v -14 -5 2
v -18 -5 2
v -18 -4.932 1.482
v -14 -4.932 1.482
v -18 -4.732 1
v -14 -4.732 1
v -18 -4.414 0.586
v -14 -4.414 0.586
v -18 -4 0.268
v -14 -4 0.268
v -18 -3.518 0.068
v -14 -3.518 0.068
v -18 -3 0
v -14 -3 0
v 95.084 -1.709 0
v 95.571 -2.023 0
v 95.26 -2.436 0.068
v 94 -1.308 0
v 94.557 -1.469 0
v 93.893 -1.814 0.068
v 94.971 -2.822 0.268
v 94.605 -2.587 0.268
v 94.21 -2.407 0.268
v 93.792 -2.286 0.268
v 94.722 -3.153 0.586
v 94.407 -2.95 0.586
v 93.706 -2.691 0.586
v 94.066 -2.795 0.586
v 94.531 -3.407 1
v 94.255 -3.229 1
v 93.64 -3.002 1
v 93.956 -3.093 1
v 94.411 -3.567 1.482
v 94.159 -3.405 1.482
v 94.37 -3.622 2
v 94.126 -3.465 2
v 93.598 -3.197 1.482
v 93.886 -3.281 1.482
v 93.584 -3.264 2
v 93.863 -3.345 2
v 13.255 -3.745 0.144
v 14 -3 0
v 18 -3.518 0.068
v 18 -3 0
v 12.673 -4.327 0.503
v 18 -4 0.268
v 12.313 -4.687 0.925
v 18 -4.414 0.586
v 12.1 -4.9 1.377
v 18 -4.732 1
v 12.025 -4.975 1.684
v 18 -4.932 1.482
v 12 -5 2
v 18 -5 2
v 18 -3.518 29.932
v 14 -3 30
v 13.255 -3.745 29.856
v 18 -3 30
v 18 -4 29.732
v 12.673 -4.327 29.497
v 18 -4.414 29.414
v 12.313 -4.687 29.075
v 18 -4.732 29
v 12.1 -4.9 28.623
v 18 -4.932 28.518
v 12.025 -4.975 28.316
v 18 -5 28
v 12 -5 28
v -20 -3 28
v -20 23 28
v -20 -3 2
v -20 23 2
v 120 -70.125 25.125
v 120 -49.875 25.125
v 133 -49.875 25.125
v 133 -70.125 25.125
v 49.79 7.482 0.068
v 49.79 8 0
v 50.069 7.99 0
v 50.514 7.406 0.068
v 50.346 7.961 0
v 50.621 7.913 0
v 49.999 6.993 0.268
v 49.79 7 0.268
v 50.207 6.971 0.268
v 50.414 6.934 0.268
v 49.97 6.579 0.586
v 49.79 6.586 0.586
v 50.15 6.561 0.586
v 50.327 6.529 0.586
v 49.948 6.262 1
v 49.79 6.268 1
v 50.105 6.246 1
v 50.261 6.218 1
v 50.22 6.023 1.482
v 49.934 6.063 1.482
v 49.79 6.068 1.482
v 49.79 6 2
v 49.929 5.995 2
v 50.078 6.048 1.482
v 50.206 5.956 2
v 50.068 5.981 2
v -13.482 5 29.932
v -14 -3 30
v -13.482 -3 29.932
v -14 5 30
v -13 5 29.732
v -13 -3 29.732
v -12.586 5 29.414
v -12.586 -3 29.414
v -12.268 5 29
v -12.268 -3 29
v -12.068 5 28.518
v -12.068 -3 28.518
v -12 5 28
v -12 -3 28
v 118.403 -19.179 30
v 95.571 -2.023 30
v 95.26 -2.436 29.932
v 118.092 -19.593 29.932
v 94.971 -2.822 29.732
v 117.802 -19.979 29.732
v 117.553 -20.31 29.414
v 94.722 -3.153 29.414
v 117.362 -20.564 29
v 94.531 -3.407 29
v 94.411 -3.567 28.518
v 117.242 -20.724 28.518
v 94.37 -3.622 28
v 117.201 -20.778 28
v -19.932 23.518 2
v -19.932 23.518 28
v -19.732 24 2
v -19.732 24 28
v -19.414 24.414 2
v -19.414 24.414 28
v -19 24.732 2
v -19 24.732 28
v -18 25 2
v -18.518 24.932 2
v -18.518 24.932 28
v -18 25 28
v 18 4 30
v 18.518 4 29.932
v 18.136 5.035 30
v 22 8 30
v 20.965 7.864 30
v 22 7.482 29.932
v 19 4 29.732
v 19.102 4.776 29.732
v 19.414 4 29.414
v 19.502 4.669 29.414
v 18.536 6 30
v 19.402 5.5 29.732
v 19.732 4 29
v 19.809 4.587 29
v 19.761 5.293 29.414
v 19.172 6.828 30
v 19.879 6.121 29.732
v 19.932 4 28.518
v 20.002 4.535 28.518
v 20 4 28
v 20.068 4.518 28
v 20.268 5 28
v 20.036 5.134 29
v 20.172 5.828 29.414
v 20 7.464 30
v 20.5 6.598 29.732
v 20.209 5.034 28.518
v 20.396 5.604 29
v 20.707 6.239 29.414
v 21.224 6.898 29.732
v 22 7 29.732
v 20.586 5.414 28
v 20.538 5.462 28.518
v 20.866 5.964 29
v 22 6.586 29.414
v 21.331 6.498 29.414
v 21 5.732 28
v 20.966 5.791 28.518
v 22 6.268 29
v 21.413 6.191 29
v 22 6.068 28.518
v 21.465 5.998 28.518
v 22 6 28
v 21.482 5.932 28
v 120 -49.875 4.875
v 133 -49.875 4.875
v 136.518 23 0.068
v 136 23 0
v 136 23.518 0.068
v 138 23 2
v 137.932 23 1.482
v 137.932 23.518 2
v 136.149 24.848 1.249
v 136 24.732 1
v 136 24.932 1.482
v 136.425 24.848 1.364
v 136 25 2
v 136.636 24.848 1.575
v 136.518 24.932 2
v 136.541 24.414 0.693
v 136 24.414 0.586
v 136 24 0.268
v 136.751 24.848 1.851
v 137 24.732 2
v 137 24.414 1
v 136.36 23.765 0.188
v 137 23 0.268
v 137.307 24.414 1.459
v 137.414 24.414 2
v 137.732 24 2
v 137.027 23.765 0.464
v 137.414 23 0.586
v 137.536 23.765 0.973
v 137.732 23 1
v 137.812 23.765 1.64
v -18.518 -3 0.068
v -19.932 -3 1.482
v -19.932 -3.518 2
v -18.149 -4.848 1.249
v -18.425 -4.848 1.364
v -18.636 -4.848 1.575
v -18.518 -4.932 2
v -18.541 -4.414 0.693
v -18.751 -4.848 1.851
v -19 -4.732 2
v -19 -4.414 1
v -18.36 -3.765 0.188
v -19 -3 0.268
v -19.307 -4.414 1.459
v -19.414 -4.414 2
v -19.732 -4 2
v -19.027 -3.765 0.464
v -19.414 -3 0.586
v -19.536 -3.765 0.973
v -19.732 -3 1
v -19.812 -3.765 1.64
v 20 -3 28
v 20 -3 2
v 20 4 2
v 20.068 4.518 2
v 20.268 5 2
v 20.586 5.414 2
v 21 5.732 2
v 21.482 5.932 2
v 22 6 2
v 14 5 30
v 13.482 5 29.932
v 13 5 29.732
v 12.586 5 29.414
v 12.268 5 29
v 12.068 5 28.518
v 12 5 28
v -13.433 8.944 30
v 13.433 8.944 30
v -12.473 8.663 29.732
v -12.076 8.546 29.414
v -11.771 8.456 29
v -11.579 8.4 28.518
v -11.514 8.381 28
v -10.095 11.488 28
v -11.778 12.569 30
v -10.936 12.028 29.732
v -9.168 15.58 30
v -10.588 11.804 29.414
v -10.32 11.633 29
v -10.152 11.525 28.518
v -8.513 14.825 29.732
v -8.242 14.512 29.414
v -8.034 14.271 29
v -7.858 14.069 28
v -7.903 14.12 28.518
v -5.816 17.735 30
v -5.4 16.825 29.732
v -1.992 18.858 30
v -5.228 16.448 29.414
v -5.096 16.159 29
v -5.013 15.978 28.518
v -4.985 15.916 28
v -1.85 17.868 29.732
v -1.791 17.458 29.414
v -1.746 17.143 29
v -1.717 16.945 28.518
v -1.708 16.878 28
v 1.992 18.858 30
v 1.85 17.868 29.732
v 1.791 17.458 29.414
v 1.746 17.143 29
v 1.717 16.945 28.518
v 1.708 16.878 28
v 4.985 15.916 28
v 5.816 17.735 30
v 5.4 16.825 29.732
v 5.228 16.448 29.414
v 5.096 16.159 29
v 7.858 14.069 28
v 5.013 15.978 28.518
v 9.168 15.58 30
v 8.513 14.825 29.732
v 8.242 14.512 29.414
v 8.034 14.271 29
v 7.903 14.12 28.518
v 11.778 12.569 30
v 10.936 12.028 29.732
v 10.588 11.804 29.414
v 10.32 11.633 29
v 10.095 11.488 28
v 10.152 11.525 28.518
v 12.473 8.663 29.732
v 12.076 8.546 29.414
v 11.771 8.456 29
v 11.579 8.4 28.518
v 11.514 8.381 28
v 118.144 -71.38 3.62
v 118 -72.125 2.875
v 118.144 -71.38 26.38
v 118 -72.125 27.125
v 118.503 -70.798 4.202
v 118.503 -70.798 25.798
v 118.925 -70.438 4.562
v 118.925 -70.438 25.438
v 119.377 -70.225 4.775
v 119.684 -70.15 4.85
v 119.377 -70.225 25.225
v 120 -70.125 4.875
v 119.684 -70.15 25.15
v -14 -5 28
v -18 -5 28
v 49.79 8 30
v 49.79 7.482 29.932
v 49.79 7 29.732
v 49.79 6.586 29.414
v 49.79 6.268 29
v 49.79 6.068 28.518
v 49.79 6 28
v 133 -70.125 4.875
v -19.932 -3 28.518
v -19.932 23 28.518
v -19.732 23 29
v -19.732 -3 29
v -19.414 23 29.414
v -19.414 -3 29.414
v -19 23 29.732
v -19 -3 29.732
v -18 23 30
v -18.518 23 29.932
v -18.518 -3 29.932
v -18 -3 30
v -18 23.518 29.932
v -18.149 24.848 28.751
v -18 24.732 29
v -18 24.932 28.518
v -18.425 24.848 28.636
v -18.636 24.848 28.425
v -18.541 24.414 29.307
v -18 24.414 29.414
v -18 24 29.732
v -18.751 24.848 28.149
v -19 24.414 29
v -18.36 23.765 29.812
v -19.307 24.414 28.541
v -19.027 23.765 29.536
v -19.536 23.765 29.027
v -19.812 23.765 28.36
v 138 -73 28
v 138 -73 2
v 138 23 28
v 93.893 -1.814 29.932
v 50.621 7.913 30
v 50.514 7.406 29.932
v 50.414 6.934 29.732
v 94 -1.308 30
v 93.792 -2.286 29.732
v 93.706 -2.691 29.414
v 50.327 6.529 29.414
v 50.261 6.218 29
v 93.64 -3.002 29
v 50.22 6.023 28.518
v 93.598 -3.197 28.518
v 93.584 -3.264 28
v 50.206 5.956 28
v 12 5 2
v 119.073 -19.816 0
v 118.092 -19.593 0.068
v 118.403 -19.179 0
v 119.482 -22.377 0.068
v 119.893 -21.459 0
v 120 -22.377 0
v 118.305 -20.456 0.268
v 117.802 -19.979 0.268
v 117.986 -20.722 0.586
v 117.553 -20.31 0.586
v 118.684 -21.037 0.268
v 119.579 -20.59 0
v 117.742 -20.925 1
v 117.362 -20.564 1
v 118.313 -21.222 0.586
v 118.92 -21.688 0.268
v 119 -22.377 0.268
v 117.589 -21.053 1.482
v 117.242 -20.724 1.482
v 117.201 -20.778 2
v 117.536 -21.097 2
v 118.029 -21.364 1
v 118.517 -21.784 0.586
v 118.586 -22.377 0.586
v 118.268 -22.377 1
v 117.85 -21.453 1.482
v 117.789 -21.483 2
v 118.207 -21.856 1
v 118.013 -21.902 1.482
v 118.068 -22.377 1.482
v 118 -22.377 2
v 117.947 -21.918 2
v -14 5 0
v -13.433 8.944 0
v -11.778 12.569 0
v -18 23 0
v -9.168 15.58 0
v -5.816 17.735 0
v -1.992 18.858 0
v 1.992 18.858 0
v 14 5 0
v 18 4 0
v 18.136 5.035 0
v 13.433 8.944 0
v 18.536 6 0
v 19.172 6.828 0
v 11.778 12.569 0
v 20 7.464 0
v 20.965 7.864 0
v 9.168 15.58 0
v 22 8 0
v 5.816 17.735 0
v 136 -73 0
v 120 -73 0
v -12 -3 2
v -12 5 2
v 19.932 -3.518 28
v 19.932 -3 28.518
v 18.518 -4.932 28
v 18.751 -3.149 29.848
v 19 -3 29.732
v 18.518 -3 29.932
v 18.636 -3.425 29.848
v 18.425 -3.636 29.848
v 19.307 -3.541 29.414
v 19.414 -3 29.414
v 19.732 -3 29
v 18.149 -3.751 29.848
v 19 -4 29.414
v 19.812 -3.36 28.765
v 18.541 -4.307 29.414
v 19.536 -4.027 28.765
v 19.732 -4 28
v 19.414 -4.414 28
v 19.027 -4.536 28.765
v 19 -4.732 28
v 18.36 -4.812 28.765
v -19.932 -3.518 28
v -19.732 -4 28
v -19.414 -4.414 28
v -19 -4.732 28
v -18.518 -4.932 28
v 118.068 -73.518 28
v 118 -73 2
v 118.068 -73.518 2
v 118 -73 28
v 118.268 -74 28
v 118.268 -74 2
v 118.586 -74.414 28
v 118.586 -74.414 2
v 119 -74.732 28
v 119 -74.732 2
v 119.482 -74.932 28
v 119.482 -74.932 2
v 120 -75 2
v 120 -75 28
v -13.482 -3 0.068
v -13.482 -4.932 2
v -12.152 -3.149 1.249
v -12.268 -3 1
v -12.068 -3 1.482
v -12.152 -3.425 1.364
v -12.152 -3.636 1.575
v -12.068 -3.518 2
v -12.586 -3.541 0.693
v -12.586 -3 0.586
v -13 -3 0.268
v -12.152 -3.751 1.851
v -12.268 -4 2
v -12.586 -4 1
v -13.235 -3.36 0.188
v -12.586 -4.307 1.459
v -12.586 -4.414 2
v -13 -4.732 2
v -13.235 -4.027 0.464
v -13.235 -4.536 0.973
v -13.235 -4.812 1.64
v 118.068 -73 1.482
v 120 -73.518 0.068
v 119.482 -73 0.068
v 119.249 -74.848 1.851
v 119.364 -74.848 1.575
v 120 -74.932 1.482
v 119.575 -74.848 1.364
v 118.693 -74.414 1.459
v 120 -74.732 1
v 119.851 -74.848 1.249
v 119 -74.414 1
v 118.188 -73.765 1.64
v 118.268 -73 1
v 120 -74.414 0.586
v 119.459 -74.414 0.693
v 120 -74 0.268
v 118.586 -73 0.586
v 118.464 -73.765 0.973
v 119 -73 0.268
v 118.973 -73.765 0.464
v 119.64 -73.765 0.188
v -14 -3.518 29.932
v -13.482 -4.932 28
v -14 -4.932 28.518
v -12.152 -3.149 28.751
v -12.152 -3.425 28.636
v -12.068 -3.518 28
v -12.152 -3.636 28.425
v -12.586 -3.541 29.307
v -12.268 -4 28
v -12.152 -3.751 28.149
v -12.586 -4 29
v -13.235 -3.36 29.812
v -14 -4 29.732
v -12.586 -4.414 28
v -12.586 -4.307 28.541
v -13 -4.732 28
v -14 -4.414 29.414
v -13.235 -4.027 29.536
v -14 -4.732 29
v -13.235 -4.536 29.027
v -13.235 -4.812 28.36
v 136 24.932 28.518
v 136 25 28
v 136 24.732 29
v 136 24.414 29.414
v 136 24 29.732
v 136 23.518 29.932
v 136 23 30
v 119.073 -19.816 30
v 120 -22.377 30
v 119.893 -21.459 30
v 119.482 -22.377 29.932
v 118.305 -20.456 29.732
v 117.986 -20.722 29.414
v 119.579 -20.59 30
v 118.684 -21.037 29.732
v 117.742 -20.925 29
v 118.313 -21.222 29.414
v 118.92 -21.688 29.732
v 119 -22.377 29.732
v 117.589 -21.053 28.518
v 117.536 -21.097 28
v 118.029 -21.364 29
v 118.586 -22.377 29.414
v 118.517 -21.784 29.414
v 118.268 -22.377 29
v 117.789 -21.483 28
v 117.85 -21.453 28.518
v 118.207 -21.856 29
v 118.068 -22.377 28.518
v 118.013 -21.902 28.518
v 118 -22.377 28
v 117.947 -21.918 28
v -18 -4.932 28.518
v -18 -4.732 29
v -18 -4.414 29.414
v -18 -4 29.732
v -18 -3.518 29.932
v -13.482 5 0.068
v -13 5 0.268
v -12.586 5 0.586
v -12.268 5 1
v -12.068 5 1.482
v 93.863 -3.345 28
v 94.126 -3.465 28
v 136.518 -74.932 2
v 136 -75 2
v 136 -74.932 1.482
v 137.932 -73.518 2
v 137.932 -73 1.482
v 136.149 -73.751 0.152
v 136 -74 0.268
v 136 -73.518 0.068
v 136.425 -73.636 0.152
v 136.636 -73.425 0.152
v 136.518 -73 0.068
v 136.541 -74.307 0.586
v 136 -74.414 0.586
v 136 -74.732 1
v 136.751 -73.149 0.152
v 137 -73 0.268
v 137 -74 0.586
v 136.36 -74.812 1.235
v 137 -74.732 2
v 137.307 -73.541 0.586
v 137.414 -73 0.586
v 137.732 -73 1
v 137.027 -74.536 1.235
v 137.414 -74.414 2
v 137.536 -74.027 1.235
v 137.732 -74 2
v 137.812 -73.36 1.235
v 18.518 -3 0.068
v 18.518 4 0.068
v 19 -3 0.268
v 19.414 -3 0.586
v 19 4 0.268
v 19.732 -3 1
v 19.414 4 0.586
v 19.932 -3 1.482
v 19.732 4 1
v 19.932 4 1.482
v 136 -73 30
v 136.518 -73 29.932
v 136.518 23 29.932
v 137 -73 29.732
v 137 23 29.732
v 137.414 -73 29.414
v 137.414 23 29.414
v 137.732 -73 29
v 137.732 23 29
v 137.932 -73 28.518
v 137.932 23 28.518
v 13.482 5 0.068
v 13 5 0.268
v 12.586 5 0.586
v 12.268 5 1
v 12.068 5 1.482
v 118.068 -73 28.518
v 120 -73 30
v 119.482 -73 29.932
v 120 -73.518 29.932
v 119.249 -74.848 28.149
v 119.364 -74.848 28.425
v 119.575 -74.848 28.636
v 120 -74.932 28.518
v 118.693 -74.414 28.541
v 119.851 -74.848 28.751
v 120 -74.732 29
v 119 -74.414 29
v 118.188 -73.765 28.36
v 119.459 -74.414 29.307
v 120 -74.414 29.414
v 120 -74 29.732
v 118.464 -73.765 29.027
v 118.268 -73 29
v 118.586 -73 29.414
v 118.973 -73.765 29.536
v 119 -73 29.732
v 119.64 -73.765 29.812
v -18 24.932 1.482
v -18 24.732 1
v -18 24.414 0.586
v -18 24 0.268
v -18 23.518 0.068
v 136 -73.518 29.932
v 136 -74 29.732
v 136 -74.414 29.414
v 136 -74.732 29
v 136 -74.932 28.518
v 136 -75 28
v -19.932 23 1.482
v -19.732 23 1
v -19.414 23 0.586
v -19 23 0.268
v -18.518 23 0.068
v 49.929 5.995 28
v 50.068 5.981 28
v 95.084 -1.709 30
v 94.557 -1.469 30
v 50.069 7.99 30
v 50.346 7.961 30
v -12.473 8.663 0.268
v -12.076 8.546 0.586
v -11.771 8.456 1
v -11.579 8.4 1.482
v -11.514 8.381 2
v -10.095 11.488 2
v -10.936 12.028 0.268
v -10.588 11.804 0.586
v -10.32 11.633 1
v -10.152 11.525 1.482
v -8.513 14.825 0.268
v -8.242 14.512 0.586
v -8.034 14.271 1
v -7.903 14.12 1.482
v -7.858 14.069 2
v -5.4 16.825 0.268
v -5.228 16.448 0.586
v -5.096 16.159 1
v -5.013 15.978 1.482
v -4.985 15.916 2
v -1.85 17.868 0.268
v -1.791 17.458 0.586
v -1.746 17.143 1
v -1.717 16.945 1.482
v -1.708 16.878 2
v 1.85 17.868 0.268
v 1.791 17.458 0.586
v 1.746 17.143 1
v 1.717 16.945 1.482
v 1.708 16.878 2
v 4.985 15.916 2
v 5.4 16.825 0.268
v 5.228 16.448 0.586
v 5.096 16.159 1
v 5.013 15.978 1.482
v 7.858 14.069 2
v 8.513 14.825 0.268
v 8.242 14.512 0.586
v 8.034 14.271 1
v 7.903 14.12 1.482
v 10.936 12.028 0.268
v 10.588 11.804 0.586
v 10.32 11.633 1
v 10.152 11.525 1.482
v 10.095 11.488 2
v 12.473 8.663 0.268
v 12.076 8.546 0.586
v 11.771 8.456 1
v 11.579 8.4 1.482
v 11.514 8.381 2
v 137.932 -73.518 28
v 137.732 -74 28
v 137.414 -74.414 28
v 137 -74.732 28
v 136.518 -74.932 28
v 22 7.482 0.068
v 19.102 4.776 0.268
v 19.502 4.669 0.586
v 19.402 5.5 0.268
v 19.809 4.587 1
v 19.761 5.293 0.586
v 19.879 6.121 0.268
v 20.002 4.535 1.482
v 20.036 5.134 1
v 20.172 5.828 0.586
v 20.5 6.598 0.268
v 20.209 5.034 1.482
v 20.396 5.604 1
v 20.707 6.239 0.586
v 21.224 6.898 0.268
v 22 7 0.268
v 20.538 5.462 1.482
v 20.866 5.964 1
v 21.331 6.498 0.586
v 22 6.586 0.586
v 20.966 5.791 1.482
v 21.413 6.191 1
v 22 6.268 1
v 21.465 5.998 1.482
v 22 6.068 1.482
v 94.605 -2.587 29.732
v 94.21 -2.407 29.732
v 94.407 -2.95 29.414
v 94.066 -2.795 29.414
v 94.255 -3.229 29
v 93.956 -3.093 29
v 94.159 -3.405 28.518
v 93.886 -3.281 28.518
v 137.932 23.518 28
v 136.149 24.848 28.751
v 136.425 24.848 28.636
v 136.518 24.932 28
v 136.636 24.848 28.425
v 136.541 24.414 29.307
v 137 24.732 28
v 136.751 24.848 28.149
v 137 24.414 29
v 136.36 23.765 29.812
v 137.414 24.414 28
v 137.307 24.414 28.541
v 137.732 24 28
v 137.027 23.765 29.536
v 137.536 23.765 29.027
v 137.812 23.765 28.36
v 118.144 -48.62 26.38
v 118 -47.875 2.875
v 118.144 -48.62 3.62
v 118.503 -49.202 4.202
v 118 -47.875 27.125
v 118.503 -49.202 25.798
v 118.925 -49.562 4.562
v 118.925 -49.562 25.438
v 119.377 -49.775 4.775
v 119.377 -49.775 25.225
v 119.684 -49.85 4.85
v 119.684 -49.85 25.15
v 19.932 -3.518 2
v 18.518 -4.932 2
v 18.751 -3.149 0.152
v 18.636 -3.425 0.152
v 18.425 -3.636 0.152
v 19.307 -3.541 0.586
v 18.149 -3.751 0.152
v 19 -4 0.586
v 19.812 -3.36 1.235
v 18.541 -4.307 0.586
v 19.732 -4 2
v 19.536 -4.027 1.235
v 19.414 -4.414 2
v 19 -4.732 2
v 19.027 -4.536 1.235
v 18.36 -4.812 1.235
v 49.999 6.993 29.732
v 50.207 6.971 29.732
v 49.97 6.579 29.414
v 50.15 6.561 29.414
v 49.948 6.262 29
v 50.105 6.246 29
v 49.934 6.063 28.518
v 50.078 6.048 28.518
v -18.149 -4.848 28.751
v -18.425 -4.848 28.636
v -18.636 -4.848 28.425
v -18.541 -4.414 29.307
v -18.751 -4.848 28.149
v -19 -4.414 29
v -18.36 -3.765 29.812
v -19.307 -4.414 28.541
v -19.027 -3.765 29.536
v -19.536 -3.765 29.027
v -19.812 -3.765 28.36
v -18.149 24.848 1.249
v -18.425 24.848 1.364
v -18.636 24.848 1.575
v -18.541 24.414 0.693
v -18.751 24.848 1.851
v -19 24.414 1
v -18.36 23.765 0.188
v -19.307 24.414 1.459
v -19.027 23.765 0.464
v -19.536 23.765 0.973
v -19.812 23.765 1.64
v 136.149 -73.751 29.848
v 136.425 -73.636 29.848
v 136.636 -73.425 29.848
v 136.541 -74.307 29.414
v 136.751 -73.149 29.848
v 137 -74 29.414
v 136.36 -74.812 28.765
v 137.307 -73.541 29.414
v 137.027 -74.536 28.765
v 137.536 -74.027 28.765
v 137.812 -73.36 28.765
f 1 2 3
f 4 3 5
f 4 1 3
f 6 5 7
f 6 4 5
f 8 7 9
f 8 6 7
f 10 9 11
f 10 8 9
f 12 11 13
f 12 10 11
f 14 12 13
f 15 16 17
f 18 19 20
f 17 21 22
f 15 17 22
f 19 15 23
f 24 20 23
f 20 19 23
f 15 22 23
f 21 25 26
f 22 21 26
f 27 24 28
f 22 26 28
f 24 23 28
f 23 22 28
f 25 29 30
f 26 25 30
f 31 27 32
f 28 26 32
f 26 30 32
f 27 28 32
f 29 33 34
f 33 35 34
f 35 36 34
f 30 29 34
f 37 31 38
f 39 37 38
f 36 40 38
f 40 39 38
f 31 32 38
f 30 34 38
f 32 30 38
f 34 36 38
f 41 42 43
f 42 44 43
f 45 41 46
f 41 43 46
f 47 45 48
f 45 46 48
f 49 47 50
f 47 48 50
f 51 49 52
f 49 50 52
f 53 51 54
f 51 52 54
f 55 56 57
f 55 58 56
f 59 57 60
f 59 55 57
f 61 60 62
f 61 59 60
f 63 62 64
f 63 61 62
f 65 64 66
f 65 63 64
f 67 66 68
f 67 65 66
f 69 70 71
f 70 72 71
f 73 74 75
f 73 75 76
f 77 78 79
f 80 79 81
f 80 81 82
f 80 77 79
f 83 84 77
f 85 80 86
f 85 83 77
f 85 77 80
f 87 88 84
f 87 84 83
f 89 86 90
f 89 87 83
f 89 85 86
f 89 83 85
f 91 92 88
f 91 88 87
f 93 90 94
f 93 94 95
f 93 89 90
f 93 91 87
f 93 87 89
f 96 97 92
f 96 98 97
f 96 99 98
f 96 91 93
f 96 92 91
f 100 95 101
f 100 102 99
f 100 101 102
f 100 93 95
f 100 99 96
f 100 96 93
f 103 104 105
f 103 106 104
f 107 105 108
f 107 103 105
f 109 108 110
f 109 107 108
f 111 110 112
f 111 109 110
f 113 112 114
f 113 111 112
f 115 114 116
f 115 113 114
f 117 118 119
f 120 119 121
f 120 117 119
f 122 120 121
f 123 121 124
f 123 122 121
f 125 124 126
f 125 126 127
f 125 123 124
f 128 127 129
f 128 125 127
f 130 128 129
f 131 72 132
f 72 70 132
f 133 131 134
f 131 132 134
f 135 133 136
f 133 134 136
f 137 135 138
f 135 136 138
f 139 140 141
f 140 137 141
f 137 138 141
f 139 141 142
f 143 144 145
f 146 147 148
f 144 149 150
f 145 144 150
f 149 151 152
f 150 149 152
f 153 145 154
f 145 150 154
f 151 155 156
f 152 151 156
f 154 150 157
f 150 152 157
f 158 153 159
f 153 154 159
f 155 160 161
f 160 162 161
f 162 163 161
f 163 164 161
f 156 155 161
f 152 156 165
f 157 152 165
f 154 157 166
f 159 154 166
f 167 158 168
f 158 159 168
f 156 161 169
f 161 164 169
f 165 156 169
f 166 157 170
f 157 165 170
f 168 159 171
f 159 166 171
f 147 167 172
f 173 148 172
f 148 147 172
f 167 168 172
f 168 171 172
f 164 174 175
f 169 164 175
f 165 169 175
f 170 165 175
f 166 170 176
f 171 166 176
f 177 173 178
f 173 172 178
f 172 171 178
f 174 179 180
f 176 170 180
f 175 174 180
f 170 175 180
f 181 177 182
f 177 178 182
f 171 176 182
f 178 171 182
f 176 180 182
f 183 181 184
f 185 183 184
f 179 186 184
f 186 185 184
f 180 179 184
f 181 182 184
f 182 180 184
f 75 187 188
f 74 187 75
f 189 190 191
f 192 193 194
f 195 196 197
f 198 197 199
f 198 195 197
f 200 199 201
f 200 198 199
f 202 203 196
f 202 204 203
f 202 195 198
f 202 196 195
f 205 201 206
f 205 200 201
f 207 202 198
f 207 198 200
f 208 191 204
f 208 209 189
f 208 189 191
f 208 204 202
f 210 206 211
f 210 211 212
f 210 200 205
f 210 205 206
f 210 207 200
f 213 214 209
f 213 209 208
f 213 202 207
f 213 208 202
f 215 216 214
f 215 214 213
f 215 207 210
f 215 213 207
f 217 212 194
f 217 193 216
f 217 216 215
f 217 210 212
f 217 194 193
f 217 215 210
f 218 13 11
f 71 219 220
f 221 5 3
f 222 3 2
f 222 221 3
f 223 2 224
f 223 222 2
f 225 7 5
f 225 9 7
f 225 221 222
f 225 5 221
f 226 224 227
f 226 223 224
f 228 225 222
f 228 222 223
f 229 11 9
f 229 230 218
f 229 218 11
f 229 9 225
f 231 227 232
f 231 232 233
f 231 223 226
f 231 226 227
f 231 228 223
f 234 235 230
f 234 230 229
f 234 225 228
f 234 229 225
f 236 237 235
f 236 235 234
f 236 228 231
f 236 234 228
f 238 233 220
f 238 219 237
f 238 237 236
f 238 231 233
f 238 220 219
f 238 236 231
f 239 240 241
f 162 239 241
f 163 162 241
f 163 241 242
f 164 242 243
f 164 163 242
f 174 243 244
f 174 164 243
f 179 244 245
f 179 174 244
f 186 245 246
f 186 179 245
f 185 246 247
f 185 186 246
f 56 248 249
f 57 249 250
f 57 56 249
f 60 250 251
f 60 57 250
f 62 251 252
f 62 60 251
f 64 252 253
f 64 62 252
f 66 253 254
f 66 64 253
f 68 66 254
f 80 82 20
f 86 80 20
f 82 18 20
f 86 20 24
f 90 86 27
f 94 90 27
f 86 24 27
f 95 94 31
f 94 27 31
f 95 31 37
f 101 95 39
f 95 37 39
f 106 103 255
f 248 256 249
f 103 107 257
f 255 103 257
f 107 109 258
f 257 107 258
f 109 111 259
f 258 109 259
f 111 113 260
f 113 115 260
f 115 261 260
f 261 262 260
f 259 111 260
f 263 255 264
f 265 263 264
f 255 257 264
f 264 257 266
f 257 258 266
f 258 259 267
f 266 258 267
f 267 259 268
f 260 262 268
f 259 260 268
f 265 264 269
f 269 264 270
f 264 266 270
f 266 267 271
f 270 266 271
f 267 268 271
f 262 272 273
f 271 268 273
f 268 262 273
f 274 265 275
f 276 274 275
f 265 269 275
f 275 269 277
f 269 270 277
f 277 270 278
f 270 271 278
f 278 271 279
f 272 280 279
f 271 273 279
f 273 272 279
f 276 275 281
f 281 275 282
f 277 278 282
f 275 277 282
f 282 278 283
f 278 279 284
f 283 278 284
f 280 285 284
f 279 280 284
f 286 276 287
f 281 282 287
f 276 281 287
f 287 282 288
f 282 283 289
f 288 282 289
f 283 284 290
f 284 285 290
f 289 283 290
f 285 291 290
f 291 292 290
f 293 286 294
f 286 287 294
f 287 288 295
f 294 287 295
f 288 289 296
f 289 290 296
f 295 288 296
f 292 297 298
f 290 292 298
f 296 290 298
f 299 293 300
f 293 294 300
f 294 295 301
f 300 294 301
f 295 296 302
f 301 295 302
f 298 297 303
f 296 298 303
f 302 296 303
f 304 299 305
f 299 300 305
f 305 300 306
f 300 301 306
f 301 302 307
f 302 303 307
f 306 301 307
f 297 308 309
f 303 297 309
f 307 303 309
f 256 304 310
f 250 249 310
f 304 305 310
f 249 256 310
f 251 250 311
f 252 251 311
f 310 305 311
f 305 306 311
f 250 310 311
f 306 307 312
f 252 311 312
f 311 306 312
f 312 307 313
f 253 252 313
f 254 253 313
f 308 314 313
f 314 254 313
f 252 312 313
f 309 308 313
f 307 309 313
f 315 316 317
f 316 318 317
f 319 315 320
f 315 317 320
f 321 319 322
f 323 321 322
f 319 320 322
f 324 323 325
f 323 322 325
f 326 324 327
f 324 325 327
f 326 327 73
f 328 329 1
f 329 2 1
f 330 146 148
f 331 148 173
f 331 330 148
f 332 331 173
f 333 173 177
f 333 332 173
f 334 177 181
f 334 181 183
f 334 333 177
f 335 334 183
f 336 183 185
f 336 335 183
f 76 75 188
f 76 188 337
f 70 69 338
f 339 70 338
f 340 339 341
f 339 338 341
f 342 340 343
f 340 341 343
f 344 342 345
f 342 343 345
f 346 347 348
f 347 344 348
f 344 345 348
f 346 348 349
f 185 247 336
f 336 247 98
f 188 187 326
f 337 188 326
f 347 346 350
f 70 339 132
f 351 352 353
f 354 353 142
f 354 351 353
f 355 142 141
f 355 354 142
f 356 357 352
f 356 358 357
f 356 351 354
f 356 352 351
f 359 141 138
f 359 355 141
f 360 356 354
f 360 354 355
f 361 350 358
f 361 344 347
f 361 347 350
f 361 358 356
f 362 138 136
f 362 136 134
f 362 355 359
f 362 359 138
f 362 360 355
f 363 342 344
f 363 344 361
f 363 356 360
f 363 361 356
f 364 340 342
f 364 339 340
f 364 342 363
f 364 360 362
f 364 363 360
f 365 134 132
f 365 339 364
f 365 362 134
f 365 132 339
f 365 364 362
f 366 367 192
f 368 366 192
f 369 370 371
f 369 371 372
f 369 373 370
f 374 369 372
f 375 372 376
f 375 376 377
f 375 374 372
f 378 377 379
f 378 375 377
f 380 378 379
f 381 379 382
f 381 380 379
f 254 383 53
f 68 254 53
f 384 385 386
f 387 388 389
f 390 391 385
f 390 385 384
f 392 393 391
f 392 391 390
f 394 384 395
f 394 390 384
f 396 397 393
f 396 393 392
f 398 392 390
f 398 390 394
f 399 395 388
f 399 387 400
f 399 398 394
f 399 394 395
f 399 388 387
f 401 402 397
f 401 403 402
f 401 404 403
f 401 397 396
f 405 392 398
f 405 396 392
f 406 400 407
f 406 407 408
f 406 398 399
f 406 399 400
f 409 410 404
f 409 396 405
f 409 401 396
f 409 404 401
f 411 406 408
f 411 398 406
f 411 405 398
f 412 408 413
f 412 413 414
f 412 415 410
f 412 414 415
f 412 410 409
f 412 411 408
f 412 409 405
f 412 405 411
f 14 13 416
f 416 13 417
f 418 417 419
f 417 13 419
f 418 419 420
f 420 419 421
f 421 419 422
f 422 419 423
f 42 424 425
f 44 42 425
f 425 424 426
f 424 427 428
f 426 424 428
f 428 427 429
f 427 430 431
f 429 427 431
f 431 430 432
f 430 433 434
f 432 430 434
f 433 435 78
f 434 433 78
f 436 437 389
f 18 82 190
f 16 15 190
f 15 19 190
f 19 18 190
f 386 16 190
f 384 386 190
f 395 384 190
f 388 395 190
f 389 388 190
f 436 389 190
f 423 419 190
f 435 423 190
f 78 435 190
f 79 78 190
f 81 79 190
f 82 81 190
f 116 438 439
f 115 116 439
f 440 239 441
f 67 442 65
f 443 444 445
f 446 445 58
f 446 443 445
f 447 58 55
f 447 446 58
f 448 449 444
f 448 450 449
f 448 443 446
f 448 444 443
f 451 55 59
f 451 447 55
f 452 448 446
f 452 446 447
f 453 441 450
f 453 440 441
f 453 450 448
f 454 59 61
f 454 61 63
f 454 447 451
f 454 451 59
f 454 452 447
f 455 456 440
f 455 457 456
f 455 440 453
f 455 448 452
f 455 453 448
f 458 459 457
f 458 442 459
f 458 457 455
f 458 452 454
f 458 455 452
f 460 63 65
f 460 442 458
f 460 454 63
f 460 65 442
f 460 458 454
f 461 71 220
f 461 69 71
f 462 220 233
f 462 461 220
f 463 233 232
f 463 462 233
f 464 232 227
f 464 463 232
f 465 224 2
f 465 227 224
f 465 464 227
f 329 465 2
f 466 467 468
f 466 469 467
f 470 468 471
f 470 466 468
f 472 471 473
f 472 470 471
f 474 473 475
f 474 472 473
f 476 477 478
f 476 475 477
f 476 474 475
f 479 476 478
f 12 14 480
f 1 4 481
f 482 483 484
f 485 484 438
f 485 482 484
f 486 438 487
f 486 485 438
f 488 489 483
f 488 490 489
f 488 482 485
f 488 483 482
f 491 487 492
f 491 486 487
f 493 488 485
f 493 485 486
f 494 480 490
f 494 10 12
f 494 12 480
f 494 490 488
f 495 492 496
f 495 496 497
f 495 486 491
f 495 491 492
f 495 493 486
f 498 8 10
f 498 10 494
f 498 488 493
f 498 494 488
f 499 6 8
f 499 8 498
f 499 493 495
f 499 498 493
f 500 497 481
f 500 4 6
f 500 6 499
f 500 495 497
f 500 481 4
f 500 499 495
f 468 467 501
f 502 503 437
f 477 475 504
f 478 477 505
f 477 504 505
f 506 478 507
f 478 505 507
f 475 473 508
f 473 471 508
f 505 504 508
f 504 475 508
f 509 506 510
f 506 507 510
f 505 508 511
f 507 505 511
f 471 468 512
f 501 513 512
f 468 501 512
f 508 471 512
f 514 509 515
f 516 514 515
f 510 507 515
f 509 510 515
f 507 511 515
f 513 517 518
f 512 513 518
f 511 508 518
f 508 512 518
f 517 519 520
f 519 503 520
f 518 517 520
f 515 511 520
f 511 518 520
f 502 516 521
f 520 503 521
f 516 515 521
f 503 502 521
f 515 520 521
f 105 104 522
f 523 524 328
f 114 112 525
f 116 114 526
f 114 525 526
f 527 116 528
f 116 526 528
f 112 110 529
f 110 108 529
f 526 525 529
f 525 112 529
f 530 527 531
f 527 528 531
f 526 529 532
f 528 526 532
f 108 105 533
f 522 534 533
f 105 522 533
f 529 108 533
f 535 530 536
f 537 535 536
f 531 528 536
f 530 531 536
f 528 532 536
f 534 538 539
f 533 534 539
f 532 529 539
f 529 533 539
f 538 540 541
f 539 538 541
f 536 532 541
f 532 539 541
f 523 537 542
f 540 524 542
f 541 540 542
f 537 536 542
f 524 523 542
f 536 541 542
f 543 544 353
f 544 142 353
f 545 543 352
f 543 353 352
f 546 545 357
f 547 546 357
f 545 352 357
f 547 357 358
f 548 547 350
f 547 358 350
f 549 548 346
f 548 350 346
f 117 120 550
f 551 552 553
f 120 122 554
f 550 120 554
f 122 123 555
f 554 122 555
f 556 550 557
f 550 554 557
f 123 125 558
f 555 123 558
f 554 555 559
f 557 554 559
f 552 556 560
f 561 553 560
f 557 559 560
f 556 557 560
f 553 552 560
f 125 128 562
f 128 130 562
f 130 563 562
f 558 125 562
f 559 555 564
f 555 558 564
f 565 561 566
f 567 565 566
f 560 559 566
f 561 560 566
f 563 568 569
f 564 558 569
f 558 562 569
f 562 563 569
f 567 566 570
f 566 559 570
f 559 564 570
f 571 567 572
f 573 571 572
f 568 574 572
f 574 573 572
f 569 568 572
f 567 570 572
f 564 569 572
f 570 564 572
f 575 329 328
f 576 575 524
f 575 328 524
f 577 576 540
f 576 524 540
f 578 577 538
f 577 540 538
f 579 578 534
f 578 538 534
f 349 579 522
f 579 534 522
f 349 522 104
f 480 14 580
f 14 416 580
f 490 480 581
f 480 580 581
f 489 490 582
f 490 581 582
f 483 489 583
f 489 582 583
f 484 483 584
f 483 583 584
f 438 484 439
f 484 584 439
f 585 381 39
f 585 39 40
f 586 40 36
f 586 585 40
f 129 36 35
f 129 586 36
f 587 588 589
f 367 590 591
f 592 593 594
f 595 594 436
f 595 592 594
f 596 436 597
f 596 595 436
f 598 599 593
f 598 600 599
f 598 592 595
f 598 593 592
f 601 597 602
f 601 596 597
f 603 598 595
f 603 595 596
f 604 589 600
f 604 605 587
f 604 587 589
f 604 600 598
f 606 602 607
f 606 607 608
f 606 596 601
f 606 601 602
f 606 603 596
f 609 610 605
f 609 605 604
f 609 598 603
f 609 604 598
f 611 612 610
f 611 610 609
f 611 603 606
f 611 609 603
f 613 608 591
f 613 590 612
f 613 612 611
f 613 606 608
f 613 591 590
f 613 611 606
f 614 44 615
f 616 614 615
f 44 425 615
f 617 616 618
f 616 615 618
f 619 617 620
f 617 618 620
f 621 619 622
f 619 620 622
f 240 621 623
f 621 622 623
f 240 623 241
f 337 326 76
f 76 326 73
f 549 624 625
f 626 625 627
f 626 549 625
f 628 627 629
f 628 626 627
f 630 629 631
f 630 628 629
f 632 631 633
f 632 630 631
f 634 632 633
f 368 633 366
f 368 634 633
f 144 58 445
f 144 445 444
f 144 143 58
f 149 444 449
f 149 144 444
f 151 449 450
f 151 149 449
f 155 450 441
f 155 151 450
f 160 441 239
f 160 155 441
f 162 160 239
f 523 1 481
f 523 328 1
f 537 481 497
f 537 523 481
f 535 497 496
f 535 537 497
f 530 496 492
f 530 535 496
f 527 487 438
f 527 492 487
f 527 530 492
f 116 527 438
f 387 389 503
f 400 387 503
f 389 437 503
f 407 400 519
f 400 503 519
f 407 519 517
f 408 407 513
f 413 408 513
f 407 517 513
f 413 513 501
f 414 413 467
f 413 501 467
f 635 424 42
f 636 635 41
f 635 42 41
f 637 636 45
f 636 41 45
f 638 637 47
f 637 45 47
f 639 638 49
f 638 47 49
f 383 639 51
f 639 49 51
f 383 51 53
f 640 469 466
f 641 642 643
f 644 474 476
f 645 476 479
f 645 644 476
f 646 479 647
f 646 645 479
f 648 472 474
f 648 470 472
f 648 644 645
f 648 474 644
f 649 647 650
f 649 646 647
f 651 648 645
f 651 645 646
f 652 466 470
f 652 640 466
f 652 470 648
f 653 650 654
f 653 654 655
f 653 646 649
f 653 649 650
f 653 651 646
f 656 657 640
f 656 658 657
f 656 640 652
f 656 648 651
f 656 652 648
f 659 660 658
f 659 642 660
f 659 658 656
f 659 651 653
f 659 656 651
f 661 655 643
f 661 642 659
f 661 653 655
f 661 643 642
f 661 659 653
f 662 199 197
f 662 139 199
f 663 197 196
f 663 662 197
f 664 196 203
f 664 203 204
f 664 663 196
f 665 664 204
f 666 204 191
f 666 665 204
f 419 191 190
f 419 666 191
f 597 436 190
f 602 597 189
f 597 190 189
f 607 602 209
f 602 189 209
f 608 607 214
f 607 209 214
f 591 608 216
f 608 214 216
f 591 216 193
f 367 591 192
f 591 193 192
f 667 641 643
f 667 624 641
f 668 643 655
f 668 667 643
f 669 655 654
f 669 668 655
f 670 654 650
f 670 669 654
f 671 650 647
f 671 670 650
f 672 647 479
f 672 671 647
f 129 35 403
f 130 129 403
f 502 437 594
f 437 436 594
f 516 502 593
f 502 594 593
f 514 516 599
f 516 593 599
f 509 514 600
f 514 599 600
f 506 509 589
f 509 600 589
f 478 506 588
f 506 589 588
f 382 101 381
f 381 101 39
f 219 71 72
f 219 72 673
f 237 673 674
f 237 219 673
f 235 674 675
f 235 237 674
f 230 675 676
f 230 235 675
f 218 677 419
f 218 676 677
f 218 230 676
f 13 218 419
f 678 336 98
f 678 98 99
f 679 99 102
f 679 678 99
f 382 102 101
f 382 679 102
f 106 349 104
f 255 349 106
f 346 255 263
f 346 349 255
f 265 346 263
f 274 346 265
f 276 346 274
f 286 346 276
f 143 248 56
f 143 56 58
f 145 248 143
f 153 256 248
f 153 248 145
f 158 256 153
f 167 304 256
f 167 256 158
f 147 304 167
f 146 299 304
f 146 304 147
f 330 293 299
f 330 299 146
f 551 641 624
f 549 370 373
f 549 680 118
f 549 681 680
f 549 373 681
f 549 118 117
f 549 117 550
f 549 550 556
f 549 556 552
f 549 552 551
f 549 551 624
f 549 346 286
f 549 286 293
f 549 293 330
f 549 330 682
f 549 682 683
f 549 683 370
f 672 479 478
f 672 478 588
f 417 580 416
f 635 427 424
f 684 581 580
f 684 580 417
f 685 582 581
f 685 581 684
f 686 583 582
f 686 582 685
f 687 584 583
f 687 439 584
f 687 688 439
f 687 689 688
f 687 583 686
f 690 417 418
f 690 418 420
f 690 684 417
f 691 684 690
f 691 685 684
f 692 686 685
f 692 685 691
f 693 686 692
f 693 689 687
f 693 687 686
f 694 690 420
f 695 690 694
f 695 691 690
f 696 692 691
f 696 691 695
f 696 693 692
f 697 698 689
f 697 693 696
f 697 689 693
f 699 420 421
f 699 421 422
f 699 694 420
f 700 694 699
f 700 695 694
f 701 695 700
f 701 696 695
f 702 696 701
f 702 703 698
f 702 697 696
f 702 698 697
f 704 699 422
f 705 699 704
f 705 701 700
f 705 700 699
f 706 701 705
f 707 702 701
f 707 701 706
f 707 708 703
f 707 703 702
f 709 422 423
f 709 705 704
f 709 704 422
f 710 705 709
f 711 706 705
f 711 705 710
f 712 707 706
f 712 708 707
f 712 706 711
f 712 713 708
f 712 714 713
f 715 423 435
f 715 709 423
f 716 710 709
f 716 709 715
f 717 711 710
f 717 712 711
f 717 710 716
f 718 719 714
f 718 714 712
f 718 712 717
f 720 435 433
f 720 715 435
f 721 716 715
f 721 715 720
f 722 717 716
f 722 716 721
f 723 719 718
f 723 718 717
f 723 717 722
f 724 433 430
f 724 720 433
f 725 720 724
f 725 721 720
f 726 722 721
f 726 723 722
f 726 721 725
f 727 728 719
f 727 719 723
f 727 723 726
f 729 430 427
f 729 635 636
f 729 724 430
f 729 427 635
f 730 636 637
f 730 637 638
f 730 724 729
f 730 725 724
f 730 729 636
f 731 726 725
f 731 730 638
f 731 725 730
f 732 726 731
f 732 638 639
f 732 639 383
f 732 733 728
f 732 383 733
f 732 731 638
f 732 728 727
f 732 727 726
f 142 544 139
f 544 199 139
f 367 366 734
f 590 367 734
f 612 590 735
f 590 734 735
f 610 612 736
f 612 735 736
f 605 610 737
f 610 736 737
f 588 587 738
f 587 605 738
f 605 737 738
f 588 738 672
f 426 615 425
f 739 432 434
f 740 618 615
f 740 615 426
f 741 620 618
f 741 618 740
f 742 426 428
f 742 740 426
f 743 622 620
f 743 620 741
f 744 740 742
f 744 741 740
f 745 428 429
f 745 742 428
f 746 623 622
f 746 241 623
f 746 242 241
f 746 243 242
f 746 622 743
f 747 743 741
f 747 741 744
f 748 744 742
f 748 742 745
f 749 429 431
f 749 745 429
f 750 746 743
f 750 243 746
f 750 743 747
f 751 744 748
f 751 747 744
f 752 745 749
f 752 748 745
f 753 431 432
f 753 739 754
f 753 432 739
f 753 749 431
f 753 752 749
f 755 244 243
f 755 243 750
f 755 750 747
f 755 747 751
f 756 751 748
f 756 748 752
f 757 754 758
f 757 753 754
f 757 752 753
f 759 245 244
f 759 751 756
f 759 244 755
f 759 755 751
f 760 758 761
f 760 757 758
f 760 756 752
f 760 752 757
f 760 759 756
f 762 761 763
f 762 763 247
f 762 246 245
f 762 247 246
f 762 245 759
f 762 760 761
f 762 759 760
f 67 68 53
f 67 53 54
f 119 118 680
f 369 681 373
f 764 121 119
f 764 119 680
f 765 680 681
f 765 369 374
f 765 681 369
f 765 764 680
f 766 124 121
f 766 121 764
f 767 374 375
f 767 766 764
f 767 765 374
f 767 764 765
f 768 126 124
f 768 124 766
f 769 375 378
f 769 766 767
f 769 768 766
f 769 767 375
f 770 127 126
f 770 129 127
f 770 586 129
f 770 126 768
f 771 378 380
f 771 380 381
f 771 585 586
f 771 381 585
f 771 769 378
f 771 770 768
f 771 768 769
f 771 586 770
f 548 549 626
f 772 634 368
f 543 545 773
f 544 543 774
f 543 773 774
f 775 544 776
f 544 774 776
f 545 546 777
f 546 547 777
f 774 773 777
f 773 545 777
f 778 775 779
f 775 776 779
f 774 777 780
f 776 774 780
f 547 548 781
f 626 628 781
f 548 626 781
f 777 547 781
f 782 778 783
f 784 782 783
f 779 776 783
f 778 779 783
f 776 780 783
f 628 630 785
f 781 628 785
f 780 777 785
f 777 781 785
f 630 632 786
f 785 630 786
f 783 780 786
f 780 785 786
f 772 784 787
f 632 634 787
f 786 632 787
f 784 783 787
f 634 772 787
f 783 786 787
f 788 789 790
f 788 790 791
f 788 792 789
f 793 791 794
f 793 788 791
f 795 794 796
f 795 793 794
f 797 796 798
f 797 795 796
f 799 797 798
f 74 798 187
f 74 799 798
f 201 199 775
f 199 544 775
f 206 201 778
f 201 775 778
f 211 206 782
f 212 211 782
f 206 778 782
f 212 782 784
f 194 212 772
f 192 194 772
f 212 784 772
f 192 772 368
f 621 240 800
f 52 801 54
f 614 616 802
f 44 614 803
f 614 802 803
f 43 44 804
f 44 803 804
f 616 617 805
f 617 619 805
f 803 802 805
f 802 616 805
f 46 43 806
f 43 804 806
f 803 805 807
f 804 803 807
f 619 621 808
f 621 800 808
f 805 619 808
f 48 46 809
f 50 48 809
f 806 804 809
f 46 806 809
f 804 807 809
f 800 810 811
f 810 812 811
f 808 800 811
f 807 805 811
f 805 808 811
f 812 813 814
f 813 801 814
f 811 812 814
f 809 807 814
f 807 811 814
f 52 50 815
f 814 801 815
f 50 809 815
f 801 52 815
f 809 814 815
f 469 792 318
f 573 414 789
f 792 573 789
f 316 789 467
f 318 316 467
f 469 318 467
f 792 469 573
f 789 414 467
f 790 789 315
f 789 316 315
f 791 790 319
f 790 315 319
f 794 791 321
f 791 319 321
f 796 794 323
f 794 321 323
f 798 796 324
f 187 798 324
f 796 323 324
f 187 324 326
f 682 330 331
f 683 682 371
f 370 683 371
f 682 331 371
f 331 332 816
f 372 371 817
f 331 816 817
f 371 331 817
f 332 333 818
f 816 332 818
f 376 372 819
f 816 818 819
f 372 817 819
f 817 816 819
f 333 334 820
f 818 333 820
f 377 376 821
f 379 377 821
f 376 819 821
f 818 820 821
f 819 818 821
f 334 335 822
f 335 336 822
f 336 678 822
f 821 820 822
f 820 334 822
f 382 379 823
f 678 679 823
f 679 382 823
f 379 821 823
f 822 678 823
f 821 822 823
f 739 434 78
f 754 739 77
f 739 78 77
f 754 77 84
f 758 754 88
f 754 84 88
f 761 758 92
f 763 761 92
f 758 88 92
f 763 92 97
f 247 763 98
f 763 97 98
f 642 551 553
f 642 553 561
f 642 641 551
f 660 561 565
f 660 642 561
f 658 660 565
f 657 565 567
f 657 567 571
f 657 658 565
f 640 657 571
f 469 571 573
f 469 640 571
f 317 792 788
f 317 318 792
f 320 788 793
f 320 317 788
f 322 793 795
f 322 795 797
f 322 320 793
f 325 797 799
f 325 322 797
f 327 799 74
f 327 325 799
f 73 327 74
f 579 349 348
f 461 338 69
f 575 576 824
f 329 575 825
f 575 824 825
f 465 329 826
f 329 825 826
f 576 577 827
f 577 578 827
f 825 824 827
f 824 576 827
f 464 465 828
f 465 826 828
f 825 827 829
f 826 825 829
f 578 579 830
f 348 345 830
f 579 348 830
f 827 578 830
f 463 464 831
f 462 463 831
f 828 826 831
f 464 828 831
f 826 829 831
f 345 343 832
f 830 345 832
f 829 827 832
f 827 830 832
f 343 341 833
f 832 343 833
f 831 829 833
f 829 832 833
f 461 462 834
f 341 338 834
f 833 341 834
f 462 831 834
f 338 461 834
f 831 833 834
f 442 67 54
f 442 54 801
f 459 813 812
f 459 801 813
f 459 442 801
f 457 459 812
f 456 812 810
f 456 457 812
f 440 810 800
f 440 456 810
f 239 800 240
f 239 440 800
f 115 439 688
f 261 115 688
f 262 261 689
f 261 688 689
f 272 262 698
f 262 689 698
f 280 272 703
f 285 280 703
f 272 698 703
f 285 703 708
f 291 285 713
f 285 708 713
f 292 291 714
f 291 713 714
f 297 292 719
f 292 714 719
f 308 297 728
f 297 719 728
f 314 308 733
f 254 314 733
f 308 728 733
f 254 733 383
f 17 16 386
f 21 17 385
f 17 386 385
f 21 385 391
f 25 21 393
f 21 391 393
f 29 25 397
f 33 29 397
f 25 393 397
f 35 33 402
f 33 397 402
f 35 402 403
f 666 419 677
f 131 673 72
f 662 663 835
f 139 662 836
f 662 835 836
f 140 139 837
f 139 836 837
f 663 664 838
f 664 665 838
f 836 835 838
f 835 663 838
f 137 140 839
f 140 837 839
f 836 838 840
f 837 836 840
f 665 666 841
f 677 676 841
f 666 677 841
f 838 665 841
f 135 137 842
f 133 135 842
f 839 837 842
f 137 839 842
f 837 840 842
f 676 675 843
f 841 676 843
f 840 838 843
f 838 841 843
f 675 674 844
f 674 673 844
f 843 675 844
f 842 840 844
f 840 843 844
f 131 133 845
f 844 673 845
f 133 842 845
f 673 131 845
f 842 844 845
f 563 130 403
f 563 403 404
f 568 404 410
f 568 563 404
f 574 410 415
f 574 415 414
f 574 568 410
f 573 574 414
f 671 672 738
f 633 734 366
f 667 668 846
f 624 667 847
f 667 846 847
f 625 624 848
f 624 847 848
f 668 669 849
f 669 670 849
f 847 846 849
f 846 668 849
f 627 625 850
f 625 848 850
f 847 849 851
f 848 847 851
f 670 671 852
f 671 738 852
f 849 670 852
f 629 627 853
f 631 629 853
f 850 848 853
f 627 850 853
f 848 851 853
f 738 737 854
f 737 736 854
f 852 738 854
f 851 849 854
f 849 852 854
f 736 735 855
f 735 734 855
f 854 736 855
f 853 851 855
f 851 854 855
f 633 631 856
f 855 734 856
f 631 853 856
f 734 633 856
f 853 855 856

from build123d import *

# Parameters (mm, degrees)
F1_DEPTH = 30
F2_W     = 20.25
F2_H     = 20.25
F3_DEPTH = 15
F4_R     = 2


# Not quite as in the source:
# - a feature names something its author has since deleted; it is built from what else it names


with BuildPart() as f1:
    # F0 (on Top) → F1 (new body)
    with BuildSketch(Plane.XY):
        Polygon((-12, -5), (-12, 5), (-12, 25), (-20, 25), (-20, -5), align=None)
        with BuildLine():
            ThreePointArc((-12, 5), (0, 17), (12, 5))
            Line((12, 5), (12, 25))
            Line((12, 25), (-12, 25))
            Line((-12, 25), (-12, 5))
        make_face()
        Polygon((12, 25), (12, 5), (12, -5), (20, -5), (20, 6), (50, 6), (94.016642033, -3.3560260868), (118, -21.3781941203), (118, -75), (138, -75), (138, -15), (138, 25), align=None)
    extrude(amount=F1_DEPTH)

    # F2 (on face) → F3 (cut)
    with BuildSketch(Plane(origin=(118, 0, 0), x_dir=(0, -1, 0), z_dir=(-1, 0, 0))):
        with Locations((60, 15)):
            Rectangle(F2_W, F2_H)
    extrude(amount=-F3_DEPTH, mode=Mode.SUBTRACT)

    # F4
    f4_edges = [f1.edges().sort_by_distance(p)[0] for p in [
        (20, -5, 15),
        (20, 6, 15),
        (20, 0.5, 0),
        (20, 0.5, 30),
        (50, 6, 15),
        (35, 6, 0),
        (35, 6, 30),
        (94.016642, -3.356026, 15),
        (118, -21.378194, 15),
        (106.008321, -12.36711, 0),
        (106.008321, -12.36711, 30),
        (118, -48.189097, 0),
        (118, -48.189097, 30),
        (118, -75, 15),
        (118, -60, 4.875),
        (118, -49.875, 15),
        (118, -60, 25.125),
        (118, -70.125, 15),
        (138, -75, 15),
        (128, -75, 0),
        (128, -75, 30),
        (-20, 10, 30),
        (-16, -5, 30),
        (-12, 0, 30),
        (0, 17, 30),
        (12, 0, 30),
        (16, -5, 30),
        (72.008321, 1.321987, 30),
        (138, -25, 30),
        (59, 25, 30),
        (-20, 10, 0),
        (-16, -5, 0),
        (-12, 0, 0),
        (0, 17, 0),
        (12, 0, 0),
        (16, -5, 0),
        (72.008321, 1.321987, 0),
        (138, -25, 0),
        (59, 25, 0),
        (-20, -5, 15),
        (-12, -5, 15),
        (138, 25, 15),
        (-20, 25, 15),
    ]]
    fillet(f4_edges, radius=F4_R)


solid = f1.part
